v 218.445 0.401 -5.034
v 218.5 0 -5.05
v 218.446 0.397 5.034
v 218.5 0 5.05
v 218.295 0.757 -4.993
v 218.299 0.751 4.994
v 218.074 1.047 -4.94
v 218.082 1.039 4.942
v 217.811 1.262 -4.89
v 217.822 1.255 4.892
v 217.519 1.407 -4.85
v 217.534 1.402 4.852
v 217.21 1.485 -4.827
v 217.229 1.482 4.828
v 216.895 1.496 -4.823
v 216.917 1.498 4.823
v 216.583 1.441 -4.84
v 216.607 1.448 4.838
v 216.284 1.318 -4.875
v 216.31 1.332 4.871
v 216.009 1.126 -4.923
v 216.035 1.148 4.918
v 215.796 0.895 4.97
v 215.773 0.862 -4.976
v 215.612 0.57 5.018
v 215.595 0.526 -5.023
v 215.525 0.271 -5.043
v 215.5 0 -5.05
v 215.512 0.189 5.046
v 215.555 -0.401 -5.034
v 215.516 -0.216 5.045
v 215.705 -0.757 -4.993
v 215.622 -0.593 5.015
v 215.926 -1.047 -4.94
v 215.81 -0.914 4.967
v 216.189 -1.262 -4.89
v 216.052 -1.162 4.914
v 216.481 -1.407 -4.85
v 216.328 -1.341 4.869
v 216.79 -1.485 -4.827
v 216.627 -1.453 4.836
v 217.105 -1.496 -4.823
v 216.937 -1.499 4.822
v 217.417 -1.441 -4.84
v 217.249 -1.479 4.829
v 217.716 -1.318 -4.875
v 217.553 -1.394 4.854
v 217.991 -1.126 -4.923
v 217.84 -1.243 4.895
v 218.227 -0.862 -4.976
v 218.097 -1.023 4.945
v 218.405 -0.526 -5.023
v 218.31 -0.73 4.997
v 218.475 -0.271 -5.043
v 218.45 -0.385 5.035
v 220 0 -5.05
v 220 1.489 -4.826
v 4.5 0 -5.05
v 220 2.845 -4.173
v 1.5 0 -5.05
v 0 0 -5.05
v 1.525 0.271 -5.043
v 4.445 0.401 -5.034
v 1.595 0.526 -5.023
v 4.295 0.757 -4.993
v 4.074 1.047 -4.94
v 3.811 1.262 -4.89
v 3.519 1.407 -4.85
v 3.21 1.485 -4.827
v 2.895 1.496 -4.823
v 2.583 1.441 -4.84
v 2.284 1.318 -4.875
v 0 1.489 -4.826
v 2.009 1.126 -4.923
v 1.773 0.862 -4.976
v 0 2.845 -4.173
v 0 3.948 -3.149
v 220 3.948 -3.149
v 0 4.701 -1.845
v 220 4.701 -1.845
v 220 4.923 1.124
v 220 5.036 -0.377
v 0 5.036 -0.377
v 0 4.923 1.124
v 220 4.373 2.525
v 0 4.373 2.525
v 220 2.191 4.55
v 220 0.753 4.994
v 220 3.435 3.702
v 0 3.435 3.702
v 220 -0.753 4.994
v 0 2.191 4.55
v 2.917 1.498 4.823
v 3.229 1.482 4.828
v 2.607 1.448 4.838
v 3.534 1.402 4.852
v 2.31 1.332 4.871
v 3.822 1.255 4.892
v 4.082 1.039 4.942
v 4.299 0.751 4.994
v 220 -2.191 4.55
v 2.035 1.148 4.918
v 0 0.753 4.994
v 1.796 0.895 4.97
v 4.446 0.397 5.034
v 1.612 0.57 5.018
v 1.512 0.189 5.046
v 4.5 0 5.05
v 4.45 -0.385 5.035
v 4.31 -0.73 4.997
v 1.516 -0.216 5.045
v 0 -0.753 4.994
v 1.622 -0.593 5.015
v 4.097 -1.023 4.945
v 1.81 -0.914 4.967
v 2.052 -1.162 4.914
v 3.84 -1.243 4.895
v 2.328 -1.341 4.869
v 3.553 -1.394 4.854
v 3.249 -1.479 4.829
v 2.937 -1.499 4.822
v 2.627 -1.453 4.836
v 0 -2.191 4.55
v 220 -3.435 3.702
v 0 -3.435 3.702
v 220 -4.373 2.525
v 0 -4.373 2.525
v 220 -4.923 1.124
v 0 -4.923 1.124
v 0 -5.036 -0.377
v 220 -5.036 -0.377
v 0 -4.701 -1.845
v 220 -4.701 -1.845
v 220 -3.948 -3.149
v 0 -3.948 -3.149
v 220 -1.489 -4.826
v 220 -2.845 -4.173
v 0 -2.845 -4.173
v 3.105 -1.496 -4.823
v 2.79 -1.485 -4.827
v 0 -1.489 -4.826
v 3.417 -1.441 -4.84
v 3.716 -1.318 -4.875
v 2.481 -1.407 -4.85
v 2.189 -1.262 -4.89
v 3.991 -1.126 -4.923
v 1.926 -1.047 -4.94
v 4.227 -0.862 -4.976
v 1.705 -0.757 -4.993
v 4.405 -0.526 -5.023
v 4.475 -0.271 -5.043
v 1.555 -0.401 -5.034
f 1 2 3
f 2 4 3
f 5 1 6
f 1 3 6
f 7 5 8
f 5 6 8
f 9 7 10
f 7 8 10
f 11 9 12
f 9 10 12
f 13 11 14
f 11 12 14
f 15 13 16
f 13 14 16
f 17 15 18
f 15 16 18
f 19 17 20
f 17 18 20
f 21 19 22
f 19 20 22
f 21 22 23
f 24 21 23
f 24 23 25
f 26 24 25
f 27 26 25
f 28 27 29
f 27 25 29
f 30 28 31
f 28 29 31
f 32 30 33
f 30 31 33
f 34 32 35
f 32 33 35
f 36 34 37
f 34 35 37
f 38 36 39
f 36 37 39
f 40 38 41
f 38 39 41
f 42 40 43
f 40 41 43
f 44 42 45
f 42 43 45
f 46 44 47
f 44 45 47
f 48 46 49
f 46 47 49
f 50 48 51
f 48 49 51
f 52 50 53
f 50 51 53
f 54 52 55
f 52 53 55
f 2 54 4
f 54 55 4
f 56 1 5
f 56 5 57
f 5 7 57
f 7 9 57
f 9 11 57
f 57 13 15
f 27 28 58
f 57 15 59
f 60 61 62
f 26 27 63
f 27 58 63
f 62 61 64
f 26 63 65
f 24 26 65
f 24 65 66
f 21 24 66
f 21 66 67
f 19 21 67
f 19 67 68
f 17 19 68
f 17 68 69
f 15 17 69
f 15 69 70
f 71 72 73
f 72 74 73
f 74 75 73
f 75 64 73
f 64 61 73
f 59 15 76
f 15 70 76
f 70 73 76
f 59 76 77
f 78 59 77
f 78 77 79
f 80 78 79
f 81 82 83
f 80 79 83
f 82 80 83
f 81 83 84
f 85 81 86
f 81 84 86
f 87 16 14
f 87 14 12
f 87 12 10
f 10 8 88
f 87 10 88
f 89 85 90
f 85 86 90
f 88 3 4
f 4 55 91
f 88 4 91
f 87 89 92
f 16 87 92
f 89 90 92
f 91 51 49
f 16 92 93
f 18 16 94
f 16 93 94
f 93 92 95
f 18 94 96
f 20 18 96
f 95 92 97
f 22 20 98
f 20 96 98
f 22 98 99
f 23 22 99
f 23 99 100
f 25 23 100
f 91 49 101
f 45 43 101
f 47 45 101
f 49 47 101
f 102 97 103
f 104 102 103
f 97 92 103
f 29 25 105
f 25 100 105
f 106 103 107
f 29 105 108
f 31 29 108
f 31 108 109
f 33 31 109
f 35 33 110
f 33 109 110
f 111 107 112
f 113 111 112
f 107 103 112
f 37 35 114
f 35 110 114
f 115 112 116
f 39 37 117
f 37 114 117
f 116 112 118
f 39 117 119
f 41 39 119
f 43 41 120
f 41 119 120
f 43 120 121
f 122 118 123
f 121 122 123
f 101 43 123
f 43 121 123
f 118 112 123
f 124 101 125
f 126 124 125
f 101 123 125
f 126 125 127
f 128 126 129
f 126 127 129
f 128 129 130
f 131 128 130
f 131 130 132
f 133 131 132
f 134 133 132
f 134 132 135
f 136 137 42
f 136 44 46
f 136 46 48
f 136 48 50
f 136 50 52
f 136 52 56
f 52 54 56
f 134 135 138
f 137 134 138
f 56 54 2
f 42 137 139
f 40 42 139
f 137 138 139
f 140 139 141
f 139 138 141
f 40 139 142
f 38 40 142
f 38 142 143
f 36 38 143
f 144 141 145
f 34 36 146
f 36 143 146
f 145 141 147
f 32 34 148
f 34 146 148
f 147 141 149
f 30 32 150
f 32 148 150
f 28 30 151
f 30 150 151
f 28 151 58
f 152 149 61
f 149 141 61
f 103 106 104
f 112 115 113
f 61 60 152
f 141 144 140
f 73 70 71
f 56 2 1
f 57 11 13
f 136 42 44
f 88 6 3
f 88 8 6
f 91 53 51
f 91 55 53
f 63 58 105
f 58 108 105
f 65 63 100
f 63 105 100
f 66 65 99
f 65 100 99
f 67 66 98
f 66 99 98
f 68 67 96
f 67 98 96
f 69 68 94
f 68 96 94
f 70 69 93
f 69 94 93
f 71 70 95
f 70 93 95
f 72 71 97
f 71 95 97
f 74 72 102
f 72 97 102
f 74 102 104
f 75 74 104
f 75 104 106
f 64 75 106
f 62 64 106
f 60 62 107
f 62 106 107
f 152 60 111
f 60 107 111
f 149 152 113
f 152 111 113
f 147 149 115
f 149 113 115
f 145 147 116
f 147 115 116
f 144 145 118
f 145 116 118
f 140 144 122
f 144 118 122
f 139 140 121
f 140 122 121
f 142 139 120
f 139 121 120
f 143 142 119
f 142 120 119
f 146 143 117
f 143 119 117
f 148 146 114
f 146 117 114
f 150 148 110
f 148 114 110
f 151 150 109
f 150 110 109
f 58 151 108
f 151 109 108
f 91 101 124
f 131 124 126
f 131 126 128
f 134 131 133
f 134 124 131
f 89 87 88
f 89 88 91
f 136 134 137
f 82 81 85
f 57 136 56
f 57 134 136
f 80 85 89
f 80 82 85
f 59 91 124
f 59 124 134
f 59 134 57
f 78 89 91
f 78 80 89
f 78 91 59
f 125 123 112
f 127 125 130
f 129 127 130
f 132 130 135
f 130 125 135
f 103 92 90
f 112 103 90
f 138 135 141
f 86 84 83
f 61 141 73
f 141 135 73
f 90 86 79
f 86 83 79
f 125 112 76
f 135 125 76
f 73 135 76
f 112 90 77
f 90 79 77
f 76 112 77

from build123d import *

# Parameters (mm, degrees)
CROQUIS1_R                        = 5.05
SALIENTE_EXTRUIR1_DEPTH           = 220
CORTAR_EXTRUIR1_REACH             = 7.05
CROQUIS2_R                        = 1.5
CORTAR_EXTRUIR1_DIRECTION_2_REACH = 7.05


with BuildPart() as part:
    # Croquis1 → Saliente-Extruir1 (new body)
    with BuildSketch(Plane(origin=(0, 0, 0), x_dir=(0, 0, -1), z_dir=(1, 0, 0))):
        Circle(CROQUIS1_R)
    extrude(amount=SALIENTE_EXTRUIR1_DEPTH)

    # Croquis2 → Cortar-Extruir1 (cut, up to next)
    with BuildSketch(Plane.XY, mode=Mode.PRIVATE) as cortar_extruir1_sk1:
        with Locations((3, 0)):
            Circle(CROQUIS2_R)
    cortar_extruir1_tool1 = extrude(cortar_extruir1_sk1.sketch, amount=-CORTAR_EXTRUIR1_REACH, mode=Mode.PRIVATE) & part.part
    add(cortar_extruir1_tool1.solids().sort_by_distance((3, 0, 0))[0], mode=Mode.SUBTRACT)
    # Croquis2 → Cortar-Extruir1 (cut, up to next)
    with BuildSketch(Plane.XY, mode=Mode.PRIVATE) as cortar_extruir1_sk2:
        with Locations((217, 0)):
            Circle(CROQUIS2_R)
    cortar_extruir1_tool2 = extrude(cortar_extruir1_sk2.sketch, amount=-CORTAR_EXTRUIR1_REACH, mode=Mode.PRIVATE) & part.part
    add(cortar_extruir1_tool2.solids().sort_by_distance((217, 0, 0))[0], mode=Mode.SUBTRACT)

    # Croquis2 → Cortar-Extruir1 direction 2 (cut, up to next)
    with BuildSketch(Plane.XY, mode=Mode.PRIVATE) as cortar_extruir1_direction_2_sk1:
        with Locations((3, 0)):
            Circle(CROQUIS2_R)
    cortar_extruir1_direction_2_tool1 = extrude(cortar_extruir1_direction_2_sk1.sketch, amount=CORTAR_EXTRUIR1_DIRECTION_2_REACH, mode=Mode.PRIVATE) & part.part
    add(cortar_extruir1_direction_2_tool1.solids().sort_by_distance((3, 0, 0))[0], mode=Mode.SUBTRACT)
    # Croquis2 → Cortar-Extruir1 direction 2 (cut, up to next)
    with BuildSketch(Plane.XY, mode=Mode.PRIVATE) as cortar_extruir1_direction_2_sk2:
        with Locations((217, 0)):
            Circle(CROQUIS2_R)
    cortar_extruir1_direction_2_tool2 = extrude(cortar_extruir1_direction_2_sk2.sketch, amount=CORTAR_EXTRUIR1_DIRECTION_2_REACH, mode=Mode.PRIVATE) & part.part
    add(cortar_extruir1_direction_2_tool2.solids().sort_by_distance((217, 0, 0))[0], mode=Mode.SUBTRACT)


solid = part.part
